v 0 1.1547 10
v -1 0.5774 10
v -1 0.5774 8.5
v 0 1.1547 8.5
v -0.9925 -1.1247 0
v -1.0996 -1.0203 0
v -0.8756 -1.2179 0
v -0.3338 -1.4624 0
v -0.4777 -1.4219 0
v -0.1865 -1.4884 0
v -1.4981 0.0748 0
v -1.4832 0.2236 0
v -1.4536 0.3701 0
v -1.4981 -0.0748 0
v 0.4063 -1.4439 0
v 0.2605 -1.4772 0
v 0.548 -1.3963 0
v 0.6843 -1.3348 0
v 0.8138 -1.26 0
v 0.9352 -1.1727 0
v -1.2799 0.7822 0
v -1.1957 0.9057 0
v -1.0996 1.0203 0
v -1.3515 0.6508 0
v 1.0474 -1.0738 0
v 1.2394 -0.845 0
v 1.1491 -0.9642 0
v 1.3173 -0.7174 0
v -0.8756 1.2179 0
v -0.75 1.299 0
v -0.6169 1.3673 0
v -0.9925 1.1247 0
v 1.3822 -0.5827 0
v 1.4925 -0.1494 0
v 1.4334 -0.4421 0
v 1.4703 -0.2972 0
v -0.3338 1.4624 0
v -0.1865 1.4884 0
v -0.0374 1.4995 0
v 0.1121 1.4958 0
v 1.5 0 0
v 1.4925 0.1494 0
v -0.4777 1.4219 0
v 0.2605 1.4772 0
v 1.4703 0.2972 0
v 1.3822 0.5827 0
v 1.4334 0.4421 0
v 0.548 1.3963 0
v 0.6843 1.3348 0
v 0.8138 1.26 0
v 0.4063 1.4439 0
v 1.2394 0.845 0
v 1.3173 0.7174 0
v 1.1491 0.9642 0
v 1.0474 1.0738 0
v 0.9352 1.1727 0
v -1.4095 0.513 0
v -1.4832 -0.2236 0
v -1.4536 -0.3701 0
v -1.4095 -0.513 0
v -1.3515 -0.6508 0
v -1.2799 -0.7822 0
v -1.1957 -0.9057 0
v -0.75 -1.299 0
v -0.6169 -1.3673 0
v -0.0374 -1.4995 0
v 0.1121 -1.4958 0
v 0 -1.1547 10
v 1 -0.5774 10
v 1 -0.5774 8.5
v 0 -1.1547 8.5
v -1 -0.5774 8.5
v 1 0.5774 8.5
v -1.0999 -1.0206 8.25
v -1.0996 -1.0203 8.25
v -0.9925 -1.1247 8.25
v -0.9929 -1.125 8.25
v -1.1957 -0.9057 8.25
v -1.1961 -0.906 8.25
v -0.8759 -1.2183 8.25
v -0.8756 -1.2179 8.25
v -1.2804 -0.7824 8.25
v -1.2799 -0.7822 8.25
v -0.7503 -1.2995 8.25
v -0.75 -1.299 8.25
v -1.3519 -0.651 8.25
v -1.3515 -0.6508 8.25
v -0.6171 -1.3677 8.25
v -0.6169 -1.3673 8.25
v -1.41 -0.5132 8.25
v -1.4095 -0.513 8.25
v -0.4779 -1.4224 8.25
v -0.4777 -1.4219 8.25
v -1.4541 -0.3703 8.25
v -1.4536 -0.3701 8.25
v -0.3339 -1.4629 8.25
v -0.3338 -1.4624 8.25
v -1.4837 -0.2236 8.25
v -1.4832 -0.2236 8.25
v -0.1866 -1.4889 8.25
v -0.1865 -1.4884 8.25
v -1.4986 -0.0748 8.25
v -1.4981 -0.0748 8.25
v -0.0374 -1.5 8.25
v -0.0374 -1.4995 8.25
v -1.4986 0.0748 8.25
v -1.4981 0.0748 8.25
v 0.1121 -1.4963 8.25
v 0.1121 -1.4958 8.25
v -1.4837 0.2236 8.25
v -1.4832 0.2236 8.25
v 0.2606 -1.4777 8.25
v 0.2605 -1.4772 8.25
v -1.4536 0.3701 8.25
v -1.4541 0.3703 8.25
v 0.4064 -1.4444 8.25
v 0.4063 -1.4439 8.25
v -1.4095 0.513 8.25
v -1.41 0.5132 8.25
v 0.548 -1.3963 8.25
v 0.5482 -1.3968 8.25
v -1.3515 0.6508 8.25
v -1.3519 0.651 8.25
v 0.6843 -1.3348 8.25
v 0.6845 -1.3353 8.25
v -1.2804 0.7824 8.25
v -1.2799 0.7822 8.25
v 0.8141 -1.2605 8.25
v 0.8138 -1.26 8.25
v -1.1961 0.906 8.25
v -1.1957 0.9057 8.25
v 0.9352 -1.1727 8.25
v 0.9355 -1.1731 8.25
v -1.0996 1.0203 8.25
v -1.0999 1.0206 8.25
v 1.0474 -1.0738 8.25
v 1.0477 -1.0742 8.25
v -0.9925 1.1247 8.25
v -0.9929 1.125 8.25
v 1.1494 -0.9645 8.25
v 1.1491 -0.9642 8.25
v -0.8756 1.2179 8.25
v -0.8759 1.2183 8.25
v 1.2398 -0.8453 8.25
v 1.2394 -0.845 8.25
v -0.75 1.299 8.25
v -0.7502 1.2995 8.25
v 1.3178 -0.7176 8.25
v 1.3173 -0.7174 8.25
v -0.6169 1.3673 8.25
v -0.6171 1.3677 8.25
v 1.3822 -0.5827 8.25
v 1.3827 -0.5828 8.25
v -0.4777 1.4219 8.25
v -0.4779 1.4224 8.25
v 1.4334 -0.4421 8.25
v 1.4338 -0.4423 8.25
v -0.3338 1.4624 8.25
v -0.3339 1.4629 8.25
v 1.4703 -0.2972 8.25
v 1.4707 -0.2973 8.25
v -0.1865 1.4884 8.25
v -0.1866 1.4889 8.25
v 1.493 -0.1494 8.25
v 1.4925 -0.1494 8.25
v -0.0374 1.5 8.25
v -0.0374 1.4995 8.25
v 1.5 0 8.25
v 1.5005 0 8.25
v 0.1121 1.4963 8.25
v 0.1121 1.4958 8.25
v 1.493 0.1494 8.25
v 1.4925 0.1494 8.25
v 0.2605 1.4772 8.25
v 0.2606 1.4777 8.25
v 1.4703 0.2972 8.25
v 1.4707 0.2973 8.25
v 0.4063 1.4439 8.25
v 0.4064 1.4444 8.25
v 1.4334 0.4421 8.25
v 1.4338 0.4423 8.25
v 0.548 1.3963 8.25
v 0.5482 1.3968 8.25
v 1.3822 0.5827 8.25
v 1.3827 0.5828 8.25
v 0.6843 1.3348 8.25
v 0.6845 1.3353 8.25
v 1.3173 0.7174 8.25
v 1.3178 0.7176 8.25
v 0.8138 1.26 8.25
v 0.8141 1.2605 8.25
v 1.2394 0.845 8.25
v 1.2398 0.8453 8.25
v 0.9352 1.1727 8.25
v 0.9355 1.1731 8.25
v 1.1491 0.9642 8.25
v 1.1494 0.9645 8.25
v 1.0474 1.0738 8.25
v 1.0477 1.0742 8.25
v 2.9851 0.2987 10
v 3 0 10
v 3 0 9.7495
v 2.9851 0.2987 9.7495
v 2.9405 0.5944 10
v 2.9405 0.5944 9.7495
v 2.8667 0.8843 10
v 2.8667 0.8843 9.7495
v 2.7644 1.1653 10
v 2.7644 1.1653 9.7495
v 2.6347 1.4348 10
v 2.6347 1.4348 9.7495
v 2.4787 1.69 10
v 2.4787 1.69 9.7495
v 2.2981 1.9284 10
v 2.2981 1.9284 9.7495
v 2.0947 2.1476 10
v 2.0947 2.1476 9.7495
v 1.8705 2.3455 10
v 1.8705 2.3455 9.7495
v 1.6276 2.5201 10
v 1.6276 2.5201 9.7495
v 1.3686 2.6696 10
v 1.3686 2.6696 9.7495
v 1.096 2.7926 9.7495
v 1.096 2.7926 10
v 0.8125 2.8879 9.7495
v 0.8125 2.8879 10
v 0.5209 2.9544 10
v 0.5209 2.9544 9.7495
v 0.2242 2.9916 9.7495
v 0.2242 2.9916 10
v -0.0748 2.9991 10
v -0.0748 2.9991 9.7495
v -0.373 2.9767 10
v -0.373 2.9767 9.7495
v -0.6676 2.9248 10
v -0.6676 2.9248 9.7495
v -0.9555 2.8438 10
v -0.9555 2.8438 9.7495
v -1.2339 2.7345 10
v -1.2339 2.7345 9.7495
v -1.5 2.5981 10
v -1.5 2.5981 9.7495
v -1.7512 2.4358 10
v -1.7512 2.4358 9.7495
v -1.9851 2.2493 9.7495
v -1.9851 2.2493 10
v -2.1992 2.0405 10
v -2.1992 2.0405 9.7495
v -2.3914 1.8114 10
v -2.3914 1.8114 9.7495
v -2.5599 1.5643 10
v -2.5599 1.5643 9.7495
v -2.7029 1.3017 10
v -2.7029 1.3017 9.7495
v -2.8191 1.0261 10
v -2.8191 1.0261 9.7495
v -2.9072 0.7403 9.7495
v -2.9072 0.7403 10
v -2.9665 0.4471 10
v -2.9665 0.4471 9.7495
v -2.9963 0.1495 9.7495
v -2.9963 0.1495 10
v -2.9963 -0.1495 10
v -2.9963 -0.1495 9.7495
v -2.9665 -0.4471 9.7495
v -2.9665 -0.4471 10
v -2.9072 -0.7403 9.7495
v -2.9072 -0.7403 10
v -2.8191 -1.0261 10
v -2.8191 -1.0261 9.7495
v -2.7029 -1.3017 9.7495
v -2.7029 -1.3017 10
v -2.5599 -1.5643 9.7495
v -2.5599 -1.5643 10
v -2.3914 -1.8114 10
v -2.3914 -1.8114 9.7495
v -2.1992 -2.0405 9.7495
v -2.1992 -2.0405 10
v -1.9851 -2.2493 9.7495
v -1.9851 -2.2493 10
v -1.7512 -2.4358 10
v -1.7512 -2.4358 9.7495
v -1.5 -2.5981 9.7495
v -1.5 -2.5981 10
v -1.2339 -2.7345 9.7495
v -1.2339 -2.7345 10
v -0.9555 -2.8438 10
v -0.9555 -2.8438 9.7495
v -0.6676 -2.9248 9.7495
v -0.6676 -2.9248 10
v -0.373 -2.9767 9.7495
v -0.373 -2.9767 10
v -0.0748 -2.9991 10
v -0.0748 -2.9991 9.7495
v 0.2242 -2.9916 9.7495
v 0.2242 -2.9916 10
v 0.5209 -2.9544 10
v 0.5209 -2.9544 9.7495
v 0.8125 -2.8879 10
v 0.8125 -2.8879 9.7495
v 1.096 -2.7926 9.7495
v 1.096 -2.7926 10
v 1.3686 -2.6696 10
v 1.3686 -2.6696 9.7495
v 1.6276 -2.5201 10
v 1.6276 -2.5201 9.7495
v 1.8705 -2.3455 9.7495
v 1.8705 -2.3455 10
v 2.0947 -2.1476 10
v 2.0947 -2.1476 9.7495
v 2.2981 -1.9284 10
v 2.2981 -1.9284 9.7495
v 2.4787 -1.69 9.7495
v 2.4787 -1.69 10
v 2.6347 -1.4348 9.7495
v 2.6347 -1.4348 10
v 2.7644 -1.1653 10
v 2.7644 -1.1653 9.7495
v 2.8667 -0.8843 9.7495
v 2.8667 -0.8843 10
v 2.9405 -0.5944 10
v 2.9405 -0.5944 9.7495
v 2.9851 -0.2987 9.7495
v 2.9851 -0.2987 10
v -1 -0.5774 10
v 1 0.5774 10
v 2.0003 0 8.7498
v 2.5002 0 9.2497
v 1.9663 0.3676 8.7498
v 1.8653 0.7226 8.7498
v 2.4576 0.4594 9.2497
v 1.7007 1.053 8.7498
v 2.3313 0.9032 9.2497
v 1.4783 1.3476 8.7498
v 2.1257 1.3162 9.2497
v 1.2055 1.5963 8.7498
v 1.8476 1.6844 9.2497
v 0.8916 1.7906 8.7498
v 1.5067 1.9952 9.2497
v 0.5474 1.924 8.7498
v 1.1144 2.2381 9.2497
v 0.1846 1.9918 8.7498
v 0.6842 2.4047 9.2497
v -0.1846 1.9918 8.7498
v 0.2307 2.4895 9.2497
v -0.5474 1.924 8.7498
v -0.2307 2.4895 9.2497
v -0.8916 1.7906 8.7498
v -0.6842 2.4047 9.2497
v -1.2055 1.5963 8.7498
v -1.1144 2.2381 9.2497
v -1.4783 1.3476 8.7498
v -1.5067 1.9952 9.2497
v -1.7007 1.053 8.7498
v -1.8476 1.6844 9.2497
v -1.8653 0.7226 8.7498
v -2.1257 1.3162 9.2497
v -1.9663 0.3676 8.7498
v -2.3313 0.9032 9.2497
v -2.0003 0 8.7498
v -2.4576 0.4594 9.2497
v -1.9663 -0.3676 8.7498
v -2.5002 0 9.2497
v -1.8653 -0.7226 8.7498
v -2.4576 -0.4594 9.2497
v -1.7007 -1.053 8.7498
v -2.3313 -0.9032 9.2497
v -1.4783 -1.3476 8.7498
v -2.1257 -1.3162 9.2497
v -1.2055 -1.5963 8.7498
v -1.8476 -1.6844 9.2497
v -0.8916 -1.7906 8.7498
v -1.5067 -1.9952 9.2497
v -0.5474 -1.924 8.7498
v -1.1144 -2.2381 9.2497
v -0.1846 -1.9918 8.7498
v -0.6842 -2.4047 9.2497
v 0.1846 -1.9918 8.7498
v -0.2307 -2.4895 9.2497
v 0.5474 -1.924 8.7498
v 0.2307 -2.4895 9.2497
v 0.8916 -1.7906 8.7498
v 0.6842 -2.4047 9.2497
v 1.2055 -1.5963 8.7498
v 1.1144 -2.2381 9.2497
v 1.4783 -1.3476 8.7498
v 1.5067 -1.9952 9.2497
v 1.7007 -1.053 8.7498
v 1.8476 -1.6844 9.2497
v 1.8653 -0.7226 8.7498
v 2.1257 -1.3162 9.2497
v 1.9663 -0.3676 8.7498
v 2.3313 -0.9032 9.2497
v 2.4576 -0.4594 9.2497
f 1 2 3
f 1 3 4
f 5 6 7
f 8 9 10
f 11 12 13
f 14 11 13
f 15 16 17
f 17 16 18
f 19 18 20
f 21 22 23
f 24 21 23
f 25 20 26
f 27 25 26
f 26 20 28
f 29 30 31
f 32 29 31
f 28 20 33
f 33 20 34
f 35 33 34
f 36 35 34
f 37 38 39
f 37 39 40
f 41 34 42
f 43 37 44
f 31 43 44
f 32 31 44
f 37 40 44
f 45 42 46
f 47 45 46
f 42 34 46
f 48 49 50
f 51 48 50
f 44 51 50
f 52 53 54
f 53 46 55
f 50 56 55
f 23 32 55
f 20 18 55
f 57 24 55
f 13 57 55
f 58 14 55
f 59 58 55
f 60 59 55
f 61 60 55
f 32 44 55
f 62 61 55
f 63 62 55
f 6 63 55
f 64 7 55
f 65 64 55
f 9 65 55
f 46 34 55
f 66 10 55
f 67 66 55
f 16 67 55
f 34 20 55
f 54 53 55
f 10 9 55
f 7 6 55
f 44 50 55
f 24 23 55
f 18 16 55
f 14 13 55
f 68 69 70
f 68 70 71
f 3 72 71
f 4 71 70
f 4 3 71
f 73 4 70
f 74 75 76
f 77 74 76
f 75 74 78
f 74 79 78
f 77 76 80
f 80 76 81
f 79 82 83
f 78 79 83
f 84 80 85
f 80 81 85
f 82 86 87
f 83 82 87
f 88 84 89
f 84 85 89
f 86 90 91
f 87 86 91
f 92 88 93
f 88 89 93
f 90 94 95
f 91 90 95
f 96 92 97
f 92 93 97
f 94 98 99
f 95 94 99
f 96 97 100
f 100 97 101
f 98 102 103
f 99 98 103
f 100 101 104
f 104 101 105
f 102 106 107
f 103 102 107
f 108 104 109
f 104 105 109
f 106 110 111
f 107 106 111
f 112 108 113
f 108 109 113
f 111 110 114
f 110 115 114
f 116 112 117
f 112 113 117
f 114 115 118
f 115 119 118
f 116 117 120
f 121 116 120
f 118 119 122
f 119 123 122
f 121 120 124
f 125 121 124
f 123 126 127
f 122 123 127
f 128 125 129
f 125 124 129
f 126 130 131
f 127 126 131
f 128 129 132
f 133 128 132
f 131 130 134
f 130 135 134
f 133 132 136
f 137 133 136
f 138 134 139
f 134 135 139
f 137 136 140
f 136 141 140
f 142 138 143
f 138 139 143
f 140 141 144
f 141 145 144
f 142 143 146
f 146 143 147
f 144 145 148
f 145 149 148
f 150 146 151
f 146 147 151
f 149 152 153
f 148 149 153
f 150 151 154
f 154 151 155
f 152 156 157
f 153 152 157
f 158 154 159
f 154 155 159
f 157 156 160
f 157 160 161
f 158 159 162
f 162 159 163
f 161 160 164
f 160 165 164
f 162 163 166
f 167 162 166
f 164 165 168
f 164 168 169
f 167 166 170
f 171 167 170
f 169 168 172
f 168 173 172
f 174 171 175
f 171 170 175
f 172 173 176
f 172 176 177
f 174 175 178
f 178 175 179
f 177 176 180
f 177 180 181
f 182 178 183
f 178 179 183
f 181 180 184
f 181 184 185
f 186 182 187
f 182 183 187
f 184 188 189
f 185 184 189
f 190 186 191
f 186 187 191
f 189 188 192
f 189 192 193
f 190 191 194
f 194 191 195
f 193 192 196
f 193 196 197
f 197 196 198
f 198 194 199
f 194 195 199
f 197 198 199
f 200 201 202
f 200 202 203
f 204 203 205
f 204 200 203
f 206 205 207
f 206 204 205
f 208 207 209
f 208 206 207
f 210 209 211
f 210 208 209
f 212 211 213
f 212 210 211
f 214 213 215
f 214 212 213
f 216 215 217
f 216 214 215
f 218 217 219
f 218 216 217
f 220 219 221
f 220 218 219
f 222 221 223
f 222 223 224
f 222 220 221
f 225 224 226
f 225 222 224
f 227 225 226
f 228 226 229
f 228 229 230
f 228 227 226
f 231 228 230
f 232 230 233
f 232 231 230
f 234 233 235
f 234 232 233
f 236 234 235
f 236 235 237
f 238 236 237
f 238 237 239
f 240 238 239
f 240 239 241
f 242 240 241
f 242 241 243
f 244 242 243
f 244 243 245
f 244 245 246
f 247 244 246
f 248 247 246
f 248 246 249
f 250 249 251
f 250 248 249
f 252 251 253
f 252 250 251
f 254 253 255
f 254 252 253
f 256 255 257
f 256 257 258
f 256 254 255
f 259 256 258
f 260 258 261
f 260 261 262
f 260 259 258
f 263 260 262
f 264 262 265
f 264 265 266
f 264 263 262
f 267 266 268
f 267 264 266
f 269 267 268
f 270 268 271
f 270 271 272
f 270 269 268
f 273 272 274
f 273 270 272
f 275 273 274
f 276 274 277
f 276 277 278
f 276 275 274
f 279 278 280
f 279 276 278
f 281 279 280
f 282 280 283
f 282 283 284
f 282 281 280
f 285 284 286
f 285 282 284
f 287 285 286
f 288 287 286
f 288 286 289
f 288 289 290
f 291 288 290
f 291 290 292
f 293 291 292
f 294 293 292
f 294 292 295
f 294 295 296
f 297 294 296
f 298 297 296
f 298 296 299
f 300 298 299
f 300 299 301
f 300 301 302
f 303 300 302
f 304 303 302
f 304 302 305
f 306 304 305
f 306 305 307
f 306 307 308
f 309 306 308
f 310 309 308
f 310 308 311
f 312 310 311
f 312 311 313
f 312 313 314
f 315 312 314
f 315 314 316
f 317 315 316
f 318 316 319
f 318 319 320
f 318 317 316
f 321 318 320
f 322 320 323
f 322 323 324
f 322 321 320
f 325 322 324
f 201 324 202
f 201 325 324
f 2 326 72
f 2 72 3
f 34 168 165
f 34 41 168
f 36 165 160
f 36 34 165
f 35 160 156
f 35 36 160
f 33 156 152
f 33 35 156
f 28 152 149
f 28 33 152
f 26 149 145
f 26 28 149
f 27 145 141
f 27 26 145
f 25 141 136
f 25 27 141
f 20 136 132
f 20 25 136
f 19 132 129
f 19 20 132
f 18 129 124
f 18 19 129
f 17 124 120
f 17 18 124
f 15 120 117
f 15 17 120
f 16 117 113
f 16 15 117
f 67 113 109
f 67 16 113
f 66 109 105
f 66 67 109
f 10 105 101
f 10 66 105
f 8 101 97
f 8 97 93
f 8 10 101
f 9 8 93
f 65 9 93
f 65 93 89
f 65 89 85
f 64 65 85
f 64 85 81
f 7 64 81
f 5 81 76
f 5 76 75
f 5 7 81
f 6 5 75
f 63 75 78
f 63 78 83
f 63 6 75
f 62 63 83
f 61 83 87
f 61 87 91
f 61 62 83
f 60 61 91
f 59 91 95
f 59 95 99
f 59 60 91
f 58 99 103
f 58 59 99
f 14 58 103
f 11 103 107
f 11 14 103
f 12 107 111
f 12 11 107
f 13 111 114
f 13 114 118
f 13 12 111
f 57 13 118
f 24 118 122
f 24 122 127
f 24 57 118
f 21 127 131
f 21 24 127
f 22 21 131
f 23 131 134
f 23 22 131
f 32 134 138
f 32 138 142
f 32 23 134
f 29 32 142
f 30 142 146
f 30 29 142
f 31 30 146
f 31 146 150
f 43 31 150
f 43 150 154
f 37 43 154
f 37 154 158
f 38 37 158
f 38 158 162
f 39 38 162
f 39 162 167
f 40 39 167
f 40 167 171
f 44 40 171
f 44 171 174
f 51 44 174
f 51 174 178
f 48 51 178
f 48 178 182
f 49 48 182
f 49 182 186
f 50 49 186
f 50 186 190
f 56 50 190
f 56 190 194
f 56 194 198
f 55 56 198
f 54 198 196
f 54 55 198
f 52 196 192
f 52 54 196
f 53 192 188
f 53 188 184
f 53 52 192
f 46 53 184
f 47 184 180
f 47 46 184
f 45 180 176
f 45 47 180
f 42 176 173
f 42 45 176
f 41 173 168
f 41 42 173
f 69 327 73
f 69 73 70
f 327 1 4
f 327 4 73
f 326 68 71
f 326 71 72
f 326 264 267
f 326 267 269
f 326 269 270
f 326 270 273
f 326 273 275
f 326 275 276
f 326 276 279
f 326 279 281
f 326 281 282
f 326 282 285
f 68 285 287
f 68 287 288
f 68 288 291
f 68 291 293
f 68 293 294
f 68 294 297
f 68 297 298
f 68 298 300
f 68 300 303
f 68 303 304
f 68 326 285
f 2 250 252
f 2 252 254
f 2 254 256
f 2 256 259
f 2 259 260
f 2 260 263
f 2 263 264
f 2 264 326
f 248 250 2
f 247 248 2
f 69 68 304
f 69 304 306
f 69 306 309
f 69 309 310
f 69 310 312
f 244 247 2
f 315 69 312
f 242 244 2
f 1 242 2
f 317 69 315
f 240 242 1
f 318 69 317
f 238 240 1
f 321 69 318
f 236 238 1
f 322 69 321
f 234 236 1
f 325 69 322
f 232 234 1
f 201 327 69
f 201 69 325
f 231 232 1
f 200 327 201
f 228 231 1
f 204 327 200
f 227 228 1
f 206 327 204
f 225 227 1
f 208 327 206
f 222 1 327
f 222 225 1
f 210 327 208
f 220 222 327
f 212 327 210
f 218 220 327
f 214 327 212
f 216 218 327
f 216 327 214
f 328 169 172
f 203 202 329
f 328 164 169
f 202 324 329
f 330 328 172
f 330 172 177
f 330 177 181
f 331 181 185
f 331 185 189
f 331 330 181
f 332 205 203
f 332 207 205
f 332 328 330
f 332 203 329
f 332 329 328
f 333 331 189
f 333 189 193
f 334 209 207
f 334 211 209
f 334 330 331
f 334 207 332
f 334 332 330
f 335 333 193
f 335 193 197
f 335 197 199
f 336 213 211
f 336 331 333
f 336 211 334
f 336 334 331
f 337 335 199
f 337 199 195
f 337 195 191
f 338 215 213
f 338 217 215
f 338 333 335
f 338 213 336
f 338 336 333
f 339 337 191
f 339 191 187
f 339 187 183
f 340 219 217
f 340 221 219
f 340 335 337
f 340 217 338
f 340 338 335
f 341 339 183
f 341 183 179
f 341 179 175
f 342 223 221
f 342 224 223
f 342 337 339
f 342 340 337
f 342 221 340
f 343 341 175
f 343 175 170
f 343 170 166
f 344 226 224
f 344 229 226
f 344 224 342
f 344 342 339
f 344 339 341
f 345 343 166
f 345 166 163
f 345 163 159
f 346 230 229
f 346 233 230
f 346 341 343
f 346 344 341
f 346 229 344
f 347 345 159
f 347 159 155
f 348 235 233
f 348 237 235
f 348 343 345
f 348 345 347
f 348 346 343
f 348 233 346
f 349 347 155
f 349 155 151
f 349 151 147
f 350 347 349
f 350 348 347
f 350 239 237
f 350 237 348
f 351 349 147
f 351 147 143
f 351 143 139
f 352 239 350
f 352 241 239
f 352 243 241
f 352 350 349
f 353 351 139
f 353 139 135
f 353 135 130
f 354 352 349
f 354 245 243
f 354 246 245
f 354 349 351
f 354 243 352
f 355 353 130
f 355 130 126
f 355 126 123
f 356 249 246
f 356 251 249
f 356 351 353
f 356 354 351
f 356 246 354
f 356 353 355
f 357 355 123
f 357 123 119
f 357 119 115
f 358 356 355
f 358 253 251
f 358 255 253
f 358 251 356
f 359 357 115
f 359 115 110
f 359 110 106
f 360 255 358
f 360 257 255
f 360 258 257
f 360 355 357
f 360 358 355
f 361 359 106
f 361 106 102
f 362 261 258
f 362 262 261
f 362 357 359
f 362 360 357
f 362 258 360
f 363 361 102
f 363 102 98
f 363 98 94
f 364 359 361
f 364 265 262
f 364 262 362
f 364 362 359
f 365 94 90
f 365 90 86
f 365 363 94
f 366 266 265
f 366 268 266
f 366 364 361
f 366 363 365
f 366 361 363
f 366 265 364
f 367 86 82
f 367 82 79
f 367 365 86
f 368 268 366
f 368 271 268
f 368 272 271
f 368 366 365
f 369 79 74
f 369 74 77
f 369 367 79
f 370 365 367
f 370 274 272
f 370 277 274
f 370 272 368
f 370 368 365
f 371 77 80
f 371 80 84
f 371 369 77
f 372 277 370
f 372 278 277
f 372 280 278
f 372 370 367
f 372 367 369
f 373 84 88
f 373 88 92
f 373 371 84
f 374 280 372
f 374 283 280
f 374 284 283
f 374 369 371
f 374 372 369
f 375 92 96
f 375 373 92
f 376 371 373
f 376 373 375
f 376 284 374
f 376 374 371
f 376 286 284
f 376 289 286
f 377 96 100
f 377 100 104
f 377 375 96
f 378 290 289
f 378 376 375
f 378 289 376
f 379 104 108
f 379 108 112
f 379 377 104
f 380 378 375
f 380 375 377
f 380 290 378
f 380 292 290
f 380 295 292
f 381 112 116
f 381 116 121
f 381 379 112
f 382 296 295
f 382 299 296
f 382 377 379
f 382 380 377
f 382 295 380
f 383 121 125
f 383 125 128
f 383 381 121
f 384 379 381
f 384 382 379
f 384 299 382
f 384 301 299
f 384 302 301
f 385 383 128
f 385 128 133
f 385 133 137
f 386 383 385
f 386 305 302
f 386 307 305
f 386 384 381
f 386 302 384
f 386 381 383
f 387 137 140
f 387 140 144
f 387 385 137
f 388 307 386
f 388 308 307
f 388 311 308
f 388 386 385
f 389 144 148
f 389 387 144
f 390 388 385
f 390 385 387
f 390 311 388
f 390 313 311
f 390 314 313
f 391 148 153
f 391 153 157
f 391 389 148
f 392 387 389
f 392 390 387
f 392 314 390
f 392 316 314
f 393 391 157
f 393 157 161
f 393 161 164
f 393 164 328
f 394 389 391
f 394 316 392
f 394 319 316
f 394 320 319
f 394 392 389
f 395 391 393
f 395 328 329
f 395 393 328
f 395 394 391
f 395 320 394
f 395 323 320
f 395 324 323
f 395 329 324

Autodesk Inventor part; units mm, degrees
ref_plane "YZ Plane" through (0, 0, 0) normal (1, 0, 0) x (0, 1, 0)
ref_plane "XZ Plane" through (0, 0, 0) normal (0, 1, 0) x (-1, 0, 0)
ref_plane "XY Plane" through (0, 0, 0) normal (0, 0, 1) x (1, 0, 0)
sketch "スケッチ1" plane through (0, 0, 0) normal (0, 0, 1) x (1, 0, 0)
  circle A0 centre (0, 0) radius 1.5
  dimension "d0" = 3
extrude "押し出し1" add sketch "スケッチ1" along normal blind 10
thread "ねじ1" size "M3x0.5" class "6g" standard "ANSI Metric M Profile" full length
sketch "スケッチ2" plane through (0, 0, 10) normal (0, 0, 1) x (1, 0, 0)
  circle A0 centre (0, 0) radius 3
  dimension "d5" = 6
extrude "押し出し2" add sketch "スケッチ2" against normal blind 1.75
chamfer "面取り1" distance 1.5 angle 45 1 edges at (-3, 0, 8.25)
sketch "スケッチ3" plane through (0, 0, 10) normal (0, 0, 1) x (1, 0, 0)
  line L0 (0, 1.1547) -> (1, 0.5774)
  line L1 (1, 0.5774) -> (1, -0.5774)
  line L2 (1, -0.5774) -> (0, -1.1547)
  line L3 (0, -1.1547) -> (-1, -0.5774)
  line L4 (-1, -0.5774) -> (-1, 0.5774)
  line L5 (-1, 0.5774) -> (0, 1.1547)
  point P0 (0, 0)
  point P1 (0, 0)
  dimension "d11" = 2
extrude "押し出し3" cut sketch "スケッチ3" against normal blind 1.5
properties part number "m3皿ネジ10 (1)" material "鉄 灰色"
